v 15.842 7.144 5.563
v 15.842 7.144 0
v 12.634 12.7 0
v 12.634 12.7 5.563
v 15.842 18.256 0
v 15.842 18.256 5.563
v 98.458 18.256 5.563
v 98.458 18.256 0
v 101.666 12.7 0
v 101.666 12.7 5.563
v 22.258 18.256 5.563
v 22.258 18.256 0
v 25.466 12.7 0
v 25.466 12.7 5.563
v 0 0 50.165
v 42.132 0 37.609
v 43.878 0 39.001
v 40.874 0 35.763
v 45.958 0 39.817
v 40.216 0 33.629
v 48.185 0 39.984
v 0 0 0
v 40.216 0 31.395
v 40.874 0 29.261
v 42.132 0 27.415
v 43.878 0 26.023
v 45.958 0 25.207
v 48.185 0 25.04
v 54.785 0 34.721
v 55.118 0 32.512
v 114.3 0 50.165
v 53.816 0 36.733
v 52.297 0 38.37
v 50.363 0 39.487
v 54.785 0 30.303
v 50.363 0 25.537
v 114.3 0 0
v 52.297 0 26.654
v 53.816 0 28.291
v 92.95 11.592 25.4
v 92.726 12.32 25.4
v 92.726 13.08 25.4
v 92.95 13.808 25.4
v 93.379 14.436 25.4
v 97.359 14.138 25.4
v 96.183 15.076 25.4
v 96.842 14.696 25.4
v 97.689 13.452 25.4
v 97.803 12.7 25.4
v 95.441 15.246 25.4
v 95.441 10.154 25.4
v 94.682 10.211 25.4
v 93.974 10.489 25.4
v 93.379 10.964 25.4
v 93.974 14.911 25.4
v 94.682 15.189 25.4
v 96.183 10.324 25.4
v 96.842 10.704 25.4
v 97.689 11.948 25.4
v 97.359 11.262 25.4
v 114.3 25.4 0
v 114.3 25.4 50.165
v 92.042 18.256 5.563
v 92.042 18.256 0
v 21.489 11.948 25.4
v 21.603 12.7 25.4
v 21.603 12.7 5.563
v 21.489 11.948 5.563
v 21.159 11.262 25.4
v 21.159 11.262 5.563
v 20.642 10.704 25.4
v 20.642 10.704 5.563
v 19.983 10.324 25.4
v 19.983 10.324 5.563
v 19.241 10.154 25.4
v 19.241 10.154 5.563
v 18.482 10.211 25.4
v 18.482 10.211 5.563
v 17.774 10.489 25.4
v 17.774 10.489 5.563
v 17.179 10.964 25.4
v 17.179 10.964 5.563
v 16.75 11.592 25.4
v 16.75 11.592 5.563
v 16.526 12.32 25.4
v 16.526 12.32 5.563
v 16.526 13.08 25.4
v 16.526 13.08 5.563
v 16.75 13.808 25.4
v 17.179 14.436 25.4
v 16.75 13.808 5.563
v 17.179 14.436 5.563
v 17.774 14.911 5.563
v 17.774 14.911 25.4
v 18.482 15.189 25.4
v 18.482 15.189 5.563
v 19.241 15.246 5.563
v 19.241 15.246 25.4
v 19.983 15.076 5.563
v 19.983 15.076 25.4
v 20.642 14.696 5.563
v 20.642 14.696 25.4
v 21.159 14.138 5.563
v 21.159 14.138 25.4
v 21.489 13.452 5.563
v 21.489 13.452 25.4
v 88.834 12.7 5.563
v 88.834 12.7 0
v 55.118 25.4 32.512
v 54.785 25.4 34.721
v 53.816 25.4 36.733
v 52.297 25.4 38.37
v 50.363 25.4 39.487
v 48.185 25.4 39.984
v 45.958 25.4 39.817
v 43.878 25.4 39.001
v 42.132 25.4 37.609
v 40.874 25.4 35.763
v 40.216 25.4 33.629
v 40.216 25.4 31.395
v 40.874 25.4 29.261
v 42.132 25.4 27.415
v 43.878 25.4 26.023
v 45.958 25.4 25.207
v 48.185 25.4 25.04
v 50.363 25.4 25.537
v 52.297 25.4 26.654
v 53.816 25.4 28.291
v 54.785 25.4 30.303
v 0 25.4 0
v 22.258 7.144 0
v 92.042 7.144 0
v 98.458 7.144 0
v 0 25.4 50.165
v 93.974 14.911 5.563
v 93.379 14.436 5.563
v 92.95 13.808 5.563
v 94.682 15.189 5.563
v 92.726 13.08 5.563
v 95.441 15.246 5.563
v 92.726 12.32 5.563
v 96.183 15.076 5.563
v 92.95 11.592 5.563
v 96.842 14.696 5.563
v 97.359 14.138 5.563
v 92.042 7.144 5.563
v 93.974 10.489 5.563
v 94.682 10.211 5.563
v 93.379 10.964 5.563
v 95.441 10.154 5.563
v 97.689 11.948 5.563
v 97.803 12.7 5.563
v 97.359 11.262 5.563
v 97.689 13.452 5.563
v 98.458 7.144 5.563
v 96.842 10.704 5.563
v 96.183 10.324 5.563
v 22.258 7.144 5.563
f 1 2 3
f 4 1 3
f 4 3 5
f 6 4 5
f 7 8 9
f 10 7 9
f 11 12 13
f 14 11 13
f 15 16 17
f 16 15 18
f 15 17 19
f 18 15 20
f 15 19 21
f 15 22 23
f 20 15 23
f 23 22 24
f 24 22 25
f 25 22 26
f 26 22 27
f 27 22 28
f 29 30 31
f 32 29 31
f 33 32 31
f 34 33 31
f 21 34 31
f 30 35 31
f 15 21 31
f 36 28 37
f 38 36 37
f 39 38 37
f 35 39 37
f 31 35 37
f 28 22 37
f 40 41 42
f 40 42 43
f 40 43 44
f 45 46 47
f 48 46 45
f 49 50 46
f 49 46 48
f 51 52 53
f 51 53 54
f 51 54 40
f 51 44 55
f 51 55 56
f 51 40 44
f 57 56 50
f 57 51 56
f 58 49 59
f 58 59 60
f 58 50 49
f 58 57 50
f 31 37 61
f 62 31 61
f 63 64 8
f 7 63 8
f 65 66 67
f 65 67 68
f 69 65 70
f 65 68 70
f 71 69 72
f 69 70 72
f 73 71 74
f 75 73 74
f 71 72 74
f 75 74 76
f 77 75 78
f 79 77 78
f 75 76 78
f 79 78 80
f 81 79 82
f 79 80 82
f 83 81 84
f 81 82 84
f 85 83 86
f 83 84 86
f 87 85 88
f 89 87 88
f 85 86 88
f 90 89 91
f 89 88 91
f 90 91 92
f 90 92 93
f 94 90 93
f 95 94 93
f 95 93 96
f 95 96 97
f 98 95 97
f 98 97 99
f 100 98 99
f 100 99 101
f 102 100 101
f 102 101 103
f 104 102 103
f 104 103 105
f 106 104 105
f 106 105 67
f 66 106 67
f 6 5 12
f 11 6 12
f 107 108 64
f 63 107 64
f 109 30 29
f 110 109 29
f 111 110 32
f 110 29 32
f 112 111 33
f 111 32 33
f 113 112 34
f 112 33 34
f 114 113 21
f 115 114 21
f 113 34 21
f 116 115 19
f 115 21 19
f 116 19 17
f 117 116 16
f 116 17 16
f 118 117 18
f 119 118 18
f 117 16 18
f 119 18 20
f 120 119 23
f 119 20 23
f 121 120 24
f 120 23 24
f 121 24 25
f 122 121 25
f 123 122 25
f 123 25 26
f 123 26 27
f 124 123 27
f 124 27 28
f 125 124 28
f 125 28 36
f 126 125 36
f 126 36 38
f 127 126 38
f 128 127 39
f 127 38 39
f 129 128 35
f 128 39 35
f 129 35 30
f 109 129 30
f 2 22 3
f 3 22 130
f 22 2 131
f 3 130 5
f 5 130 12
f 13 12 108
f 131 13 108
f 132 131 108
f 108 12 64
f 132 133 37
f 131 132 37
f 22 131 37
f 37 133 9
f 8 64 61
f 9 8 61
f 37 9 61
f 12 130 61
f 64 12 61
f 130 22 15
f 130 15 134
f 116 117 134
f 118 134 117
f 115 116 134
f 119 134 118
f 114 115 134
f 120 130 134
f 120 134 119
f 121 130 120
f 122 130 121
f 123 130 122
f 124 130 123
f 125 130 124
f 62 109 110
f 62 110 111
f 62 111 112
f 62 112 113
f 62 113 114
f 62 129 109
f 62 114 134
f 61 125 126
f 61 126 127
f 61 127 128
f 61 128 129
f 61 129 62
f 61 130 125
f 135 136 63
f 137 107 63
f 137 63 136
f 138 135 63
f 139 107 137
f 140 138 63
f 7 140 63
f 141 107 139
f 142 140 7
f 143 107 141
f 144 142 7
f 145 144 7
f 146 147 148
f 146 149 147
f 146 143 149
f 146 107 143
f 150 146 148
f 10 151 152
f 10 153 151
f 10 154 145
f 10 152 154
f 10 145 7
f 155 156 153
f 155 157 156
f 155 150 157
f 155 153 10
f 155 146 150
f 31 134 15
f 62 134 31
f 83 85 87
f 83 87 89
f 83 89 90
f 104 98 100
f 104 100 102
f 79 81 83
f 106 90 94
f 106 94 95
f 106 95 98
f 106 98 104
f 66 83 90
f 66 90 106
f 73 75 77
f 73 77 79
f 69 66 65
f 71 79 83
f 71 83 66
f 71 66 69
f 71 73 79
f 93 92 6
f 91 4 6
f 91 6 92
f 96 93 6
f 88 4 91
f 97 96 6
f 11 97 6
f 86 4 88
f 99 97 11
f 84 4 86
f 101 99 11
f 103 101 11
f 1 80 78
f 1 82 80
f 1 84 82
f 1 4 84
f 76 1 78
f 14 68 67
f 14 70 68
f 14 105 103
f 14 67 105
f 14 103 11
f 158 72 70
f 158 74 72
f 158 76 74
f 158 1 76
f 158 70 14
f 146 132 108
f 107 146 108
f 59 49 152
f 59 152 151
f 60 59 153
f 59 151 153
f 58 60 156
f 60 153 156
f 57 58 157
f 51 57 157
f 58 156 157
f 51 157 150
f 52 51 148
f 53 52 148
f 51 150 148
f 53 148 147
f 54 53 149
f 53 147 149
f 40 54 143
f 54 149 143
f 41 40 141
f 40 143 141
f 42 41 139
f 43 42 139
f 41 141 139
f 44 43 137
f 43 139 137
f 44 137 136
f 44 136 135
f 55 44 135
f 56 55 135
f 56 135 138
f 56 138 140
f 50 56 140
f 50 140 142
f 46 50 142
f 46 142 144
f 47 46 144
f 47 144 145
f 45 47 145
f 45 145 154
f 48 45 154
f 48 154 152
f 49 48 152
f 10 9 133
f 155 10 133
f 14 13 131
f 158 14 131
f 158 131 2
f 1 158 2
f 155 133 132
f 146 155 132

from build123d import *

# Parameters (mm, degrees)
F0_W     = 114.3
F0_H     = 25.4
F1_DEPTH = 50.165
F2_R     = 7.493
F3_DEPTH = 25.4
F4_R     = 2.5527
F5_DEPTH = 25.4
F7_DEPTH = 5.5626


with BuildPart() as f1:
    # F0 (on Top) → F1 (new body)
    with BuildSketch(Plane.XY):
        with Locations((57.15, 12.7)):
            Rectangle(F0_W, F0_H)
    extrude(amount=F1_DEPTH)

    # F2 (on face) → F3 (cut)
    with BuildSketch(Plane.XZ):
        with Locations((47.625, 32.512)):
            Circle(F2_R)
    extrude(amount=-F3_DEPTH, mode=Mode.SUBTRACT)

    # F4 (on face) → F5 (cut)
    with BuildSketch(Plane(origin=(0, 0, 0), x_dir=(1, 0, 0), z_dir=(0, 0, -1))):
        with Locations((19.05, -12.7)):
            Circle(F4_R)
        with Locations((95.25, -12.7)):
            Circle(F4_R)
    extrude(amount=-F5_DEPTH, mode=Mode.SUBTRACT)

    # F6 (on face) → F7 (cut)
    with BuildSketch(Plane(origin=(0, 0, 0), x_dir=(1, 0, 0), z_dir=(0, 0, -1))):
        Polygon((12.634195, -12.7), (15.842098, -18.25625), (22.257902, -18.25625), (25.465805, -12.7), (22.257902, -7.14375), (15.842098, -7.14375), align=None)
        Polygon((88.834195, -12.7), (92.042098, -18.25625), (98.457902, -18.25625), (101.665805, -12.7), (98.457902, -7.14375), (92.042098, -7.14375), align=None)
    extrude(amount=-F7_DEPTH, mode=Mode.SUBTRACT)


solid = f1.part
